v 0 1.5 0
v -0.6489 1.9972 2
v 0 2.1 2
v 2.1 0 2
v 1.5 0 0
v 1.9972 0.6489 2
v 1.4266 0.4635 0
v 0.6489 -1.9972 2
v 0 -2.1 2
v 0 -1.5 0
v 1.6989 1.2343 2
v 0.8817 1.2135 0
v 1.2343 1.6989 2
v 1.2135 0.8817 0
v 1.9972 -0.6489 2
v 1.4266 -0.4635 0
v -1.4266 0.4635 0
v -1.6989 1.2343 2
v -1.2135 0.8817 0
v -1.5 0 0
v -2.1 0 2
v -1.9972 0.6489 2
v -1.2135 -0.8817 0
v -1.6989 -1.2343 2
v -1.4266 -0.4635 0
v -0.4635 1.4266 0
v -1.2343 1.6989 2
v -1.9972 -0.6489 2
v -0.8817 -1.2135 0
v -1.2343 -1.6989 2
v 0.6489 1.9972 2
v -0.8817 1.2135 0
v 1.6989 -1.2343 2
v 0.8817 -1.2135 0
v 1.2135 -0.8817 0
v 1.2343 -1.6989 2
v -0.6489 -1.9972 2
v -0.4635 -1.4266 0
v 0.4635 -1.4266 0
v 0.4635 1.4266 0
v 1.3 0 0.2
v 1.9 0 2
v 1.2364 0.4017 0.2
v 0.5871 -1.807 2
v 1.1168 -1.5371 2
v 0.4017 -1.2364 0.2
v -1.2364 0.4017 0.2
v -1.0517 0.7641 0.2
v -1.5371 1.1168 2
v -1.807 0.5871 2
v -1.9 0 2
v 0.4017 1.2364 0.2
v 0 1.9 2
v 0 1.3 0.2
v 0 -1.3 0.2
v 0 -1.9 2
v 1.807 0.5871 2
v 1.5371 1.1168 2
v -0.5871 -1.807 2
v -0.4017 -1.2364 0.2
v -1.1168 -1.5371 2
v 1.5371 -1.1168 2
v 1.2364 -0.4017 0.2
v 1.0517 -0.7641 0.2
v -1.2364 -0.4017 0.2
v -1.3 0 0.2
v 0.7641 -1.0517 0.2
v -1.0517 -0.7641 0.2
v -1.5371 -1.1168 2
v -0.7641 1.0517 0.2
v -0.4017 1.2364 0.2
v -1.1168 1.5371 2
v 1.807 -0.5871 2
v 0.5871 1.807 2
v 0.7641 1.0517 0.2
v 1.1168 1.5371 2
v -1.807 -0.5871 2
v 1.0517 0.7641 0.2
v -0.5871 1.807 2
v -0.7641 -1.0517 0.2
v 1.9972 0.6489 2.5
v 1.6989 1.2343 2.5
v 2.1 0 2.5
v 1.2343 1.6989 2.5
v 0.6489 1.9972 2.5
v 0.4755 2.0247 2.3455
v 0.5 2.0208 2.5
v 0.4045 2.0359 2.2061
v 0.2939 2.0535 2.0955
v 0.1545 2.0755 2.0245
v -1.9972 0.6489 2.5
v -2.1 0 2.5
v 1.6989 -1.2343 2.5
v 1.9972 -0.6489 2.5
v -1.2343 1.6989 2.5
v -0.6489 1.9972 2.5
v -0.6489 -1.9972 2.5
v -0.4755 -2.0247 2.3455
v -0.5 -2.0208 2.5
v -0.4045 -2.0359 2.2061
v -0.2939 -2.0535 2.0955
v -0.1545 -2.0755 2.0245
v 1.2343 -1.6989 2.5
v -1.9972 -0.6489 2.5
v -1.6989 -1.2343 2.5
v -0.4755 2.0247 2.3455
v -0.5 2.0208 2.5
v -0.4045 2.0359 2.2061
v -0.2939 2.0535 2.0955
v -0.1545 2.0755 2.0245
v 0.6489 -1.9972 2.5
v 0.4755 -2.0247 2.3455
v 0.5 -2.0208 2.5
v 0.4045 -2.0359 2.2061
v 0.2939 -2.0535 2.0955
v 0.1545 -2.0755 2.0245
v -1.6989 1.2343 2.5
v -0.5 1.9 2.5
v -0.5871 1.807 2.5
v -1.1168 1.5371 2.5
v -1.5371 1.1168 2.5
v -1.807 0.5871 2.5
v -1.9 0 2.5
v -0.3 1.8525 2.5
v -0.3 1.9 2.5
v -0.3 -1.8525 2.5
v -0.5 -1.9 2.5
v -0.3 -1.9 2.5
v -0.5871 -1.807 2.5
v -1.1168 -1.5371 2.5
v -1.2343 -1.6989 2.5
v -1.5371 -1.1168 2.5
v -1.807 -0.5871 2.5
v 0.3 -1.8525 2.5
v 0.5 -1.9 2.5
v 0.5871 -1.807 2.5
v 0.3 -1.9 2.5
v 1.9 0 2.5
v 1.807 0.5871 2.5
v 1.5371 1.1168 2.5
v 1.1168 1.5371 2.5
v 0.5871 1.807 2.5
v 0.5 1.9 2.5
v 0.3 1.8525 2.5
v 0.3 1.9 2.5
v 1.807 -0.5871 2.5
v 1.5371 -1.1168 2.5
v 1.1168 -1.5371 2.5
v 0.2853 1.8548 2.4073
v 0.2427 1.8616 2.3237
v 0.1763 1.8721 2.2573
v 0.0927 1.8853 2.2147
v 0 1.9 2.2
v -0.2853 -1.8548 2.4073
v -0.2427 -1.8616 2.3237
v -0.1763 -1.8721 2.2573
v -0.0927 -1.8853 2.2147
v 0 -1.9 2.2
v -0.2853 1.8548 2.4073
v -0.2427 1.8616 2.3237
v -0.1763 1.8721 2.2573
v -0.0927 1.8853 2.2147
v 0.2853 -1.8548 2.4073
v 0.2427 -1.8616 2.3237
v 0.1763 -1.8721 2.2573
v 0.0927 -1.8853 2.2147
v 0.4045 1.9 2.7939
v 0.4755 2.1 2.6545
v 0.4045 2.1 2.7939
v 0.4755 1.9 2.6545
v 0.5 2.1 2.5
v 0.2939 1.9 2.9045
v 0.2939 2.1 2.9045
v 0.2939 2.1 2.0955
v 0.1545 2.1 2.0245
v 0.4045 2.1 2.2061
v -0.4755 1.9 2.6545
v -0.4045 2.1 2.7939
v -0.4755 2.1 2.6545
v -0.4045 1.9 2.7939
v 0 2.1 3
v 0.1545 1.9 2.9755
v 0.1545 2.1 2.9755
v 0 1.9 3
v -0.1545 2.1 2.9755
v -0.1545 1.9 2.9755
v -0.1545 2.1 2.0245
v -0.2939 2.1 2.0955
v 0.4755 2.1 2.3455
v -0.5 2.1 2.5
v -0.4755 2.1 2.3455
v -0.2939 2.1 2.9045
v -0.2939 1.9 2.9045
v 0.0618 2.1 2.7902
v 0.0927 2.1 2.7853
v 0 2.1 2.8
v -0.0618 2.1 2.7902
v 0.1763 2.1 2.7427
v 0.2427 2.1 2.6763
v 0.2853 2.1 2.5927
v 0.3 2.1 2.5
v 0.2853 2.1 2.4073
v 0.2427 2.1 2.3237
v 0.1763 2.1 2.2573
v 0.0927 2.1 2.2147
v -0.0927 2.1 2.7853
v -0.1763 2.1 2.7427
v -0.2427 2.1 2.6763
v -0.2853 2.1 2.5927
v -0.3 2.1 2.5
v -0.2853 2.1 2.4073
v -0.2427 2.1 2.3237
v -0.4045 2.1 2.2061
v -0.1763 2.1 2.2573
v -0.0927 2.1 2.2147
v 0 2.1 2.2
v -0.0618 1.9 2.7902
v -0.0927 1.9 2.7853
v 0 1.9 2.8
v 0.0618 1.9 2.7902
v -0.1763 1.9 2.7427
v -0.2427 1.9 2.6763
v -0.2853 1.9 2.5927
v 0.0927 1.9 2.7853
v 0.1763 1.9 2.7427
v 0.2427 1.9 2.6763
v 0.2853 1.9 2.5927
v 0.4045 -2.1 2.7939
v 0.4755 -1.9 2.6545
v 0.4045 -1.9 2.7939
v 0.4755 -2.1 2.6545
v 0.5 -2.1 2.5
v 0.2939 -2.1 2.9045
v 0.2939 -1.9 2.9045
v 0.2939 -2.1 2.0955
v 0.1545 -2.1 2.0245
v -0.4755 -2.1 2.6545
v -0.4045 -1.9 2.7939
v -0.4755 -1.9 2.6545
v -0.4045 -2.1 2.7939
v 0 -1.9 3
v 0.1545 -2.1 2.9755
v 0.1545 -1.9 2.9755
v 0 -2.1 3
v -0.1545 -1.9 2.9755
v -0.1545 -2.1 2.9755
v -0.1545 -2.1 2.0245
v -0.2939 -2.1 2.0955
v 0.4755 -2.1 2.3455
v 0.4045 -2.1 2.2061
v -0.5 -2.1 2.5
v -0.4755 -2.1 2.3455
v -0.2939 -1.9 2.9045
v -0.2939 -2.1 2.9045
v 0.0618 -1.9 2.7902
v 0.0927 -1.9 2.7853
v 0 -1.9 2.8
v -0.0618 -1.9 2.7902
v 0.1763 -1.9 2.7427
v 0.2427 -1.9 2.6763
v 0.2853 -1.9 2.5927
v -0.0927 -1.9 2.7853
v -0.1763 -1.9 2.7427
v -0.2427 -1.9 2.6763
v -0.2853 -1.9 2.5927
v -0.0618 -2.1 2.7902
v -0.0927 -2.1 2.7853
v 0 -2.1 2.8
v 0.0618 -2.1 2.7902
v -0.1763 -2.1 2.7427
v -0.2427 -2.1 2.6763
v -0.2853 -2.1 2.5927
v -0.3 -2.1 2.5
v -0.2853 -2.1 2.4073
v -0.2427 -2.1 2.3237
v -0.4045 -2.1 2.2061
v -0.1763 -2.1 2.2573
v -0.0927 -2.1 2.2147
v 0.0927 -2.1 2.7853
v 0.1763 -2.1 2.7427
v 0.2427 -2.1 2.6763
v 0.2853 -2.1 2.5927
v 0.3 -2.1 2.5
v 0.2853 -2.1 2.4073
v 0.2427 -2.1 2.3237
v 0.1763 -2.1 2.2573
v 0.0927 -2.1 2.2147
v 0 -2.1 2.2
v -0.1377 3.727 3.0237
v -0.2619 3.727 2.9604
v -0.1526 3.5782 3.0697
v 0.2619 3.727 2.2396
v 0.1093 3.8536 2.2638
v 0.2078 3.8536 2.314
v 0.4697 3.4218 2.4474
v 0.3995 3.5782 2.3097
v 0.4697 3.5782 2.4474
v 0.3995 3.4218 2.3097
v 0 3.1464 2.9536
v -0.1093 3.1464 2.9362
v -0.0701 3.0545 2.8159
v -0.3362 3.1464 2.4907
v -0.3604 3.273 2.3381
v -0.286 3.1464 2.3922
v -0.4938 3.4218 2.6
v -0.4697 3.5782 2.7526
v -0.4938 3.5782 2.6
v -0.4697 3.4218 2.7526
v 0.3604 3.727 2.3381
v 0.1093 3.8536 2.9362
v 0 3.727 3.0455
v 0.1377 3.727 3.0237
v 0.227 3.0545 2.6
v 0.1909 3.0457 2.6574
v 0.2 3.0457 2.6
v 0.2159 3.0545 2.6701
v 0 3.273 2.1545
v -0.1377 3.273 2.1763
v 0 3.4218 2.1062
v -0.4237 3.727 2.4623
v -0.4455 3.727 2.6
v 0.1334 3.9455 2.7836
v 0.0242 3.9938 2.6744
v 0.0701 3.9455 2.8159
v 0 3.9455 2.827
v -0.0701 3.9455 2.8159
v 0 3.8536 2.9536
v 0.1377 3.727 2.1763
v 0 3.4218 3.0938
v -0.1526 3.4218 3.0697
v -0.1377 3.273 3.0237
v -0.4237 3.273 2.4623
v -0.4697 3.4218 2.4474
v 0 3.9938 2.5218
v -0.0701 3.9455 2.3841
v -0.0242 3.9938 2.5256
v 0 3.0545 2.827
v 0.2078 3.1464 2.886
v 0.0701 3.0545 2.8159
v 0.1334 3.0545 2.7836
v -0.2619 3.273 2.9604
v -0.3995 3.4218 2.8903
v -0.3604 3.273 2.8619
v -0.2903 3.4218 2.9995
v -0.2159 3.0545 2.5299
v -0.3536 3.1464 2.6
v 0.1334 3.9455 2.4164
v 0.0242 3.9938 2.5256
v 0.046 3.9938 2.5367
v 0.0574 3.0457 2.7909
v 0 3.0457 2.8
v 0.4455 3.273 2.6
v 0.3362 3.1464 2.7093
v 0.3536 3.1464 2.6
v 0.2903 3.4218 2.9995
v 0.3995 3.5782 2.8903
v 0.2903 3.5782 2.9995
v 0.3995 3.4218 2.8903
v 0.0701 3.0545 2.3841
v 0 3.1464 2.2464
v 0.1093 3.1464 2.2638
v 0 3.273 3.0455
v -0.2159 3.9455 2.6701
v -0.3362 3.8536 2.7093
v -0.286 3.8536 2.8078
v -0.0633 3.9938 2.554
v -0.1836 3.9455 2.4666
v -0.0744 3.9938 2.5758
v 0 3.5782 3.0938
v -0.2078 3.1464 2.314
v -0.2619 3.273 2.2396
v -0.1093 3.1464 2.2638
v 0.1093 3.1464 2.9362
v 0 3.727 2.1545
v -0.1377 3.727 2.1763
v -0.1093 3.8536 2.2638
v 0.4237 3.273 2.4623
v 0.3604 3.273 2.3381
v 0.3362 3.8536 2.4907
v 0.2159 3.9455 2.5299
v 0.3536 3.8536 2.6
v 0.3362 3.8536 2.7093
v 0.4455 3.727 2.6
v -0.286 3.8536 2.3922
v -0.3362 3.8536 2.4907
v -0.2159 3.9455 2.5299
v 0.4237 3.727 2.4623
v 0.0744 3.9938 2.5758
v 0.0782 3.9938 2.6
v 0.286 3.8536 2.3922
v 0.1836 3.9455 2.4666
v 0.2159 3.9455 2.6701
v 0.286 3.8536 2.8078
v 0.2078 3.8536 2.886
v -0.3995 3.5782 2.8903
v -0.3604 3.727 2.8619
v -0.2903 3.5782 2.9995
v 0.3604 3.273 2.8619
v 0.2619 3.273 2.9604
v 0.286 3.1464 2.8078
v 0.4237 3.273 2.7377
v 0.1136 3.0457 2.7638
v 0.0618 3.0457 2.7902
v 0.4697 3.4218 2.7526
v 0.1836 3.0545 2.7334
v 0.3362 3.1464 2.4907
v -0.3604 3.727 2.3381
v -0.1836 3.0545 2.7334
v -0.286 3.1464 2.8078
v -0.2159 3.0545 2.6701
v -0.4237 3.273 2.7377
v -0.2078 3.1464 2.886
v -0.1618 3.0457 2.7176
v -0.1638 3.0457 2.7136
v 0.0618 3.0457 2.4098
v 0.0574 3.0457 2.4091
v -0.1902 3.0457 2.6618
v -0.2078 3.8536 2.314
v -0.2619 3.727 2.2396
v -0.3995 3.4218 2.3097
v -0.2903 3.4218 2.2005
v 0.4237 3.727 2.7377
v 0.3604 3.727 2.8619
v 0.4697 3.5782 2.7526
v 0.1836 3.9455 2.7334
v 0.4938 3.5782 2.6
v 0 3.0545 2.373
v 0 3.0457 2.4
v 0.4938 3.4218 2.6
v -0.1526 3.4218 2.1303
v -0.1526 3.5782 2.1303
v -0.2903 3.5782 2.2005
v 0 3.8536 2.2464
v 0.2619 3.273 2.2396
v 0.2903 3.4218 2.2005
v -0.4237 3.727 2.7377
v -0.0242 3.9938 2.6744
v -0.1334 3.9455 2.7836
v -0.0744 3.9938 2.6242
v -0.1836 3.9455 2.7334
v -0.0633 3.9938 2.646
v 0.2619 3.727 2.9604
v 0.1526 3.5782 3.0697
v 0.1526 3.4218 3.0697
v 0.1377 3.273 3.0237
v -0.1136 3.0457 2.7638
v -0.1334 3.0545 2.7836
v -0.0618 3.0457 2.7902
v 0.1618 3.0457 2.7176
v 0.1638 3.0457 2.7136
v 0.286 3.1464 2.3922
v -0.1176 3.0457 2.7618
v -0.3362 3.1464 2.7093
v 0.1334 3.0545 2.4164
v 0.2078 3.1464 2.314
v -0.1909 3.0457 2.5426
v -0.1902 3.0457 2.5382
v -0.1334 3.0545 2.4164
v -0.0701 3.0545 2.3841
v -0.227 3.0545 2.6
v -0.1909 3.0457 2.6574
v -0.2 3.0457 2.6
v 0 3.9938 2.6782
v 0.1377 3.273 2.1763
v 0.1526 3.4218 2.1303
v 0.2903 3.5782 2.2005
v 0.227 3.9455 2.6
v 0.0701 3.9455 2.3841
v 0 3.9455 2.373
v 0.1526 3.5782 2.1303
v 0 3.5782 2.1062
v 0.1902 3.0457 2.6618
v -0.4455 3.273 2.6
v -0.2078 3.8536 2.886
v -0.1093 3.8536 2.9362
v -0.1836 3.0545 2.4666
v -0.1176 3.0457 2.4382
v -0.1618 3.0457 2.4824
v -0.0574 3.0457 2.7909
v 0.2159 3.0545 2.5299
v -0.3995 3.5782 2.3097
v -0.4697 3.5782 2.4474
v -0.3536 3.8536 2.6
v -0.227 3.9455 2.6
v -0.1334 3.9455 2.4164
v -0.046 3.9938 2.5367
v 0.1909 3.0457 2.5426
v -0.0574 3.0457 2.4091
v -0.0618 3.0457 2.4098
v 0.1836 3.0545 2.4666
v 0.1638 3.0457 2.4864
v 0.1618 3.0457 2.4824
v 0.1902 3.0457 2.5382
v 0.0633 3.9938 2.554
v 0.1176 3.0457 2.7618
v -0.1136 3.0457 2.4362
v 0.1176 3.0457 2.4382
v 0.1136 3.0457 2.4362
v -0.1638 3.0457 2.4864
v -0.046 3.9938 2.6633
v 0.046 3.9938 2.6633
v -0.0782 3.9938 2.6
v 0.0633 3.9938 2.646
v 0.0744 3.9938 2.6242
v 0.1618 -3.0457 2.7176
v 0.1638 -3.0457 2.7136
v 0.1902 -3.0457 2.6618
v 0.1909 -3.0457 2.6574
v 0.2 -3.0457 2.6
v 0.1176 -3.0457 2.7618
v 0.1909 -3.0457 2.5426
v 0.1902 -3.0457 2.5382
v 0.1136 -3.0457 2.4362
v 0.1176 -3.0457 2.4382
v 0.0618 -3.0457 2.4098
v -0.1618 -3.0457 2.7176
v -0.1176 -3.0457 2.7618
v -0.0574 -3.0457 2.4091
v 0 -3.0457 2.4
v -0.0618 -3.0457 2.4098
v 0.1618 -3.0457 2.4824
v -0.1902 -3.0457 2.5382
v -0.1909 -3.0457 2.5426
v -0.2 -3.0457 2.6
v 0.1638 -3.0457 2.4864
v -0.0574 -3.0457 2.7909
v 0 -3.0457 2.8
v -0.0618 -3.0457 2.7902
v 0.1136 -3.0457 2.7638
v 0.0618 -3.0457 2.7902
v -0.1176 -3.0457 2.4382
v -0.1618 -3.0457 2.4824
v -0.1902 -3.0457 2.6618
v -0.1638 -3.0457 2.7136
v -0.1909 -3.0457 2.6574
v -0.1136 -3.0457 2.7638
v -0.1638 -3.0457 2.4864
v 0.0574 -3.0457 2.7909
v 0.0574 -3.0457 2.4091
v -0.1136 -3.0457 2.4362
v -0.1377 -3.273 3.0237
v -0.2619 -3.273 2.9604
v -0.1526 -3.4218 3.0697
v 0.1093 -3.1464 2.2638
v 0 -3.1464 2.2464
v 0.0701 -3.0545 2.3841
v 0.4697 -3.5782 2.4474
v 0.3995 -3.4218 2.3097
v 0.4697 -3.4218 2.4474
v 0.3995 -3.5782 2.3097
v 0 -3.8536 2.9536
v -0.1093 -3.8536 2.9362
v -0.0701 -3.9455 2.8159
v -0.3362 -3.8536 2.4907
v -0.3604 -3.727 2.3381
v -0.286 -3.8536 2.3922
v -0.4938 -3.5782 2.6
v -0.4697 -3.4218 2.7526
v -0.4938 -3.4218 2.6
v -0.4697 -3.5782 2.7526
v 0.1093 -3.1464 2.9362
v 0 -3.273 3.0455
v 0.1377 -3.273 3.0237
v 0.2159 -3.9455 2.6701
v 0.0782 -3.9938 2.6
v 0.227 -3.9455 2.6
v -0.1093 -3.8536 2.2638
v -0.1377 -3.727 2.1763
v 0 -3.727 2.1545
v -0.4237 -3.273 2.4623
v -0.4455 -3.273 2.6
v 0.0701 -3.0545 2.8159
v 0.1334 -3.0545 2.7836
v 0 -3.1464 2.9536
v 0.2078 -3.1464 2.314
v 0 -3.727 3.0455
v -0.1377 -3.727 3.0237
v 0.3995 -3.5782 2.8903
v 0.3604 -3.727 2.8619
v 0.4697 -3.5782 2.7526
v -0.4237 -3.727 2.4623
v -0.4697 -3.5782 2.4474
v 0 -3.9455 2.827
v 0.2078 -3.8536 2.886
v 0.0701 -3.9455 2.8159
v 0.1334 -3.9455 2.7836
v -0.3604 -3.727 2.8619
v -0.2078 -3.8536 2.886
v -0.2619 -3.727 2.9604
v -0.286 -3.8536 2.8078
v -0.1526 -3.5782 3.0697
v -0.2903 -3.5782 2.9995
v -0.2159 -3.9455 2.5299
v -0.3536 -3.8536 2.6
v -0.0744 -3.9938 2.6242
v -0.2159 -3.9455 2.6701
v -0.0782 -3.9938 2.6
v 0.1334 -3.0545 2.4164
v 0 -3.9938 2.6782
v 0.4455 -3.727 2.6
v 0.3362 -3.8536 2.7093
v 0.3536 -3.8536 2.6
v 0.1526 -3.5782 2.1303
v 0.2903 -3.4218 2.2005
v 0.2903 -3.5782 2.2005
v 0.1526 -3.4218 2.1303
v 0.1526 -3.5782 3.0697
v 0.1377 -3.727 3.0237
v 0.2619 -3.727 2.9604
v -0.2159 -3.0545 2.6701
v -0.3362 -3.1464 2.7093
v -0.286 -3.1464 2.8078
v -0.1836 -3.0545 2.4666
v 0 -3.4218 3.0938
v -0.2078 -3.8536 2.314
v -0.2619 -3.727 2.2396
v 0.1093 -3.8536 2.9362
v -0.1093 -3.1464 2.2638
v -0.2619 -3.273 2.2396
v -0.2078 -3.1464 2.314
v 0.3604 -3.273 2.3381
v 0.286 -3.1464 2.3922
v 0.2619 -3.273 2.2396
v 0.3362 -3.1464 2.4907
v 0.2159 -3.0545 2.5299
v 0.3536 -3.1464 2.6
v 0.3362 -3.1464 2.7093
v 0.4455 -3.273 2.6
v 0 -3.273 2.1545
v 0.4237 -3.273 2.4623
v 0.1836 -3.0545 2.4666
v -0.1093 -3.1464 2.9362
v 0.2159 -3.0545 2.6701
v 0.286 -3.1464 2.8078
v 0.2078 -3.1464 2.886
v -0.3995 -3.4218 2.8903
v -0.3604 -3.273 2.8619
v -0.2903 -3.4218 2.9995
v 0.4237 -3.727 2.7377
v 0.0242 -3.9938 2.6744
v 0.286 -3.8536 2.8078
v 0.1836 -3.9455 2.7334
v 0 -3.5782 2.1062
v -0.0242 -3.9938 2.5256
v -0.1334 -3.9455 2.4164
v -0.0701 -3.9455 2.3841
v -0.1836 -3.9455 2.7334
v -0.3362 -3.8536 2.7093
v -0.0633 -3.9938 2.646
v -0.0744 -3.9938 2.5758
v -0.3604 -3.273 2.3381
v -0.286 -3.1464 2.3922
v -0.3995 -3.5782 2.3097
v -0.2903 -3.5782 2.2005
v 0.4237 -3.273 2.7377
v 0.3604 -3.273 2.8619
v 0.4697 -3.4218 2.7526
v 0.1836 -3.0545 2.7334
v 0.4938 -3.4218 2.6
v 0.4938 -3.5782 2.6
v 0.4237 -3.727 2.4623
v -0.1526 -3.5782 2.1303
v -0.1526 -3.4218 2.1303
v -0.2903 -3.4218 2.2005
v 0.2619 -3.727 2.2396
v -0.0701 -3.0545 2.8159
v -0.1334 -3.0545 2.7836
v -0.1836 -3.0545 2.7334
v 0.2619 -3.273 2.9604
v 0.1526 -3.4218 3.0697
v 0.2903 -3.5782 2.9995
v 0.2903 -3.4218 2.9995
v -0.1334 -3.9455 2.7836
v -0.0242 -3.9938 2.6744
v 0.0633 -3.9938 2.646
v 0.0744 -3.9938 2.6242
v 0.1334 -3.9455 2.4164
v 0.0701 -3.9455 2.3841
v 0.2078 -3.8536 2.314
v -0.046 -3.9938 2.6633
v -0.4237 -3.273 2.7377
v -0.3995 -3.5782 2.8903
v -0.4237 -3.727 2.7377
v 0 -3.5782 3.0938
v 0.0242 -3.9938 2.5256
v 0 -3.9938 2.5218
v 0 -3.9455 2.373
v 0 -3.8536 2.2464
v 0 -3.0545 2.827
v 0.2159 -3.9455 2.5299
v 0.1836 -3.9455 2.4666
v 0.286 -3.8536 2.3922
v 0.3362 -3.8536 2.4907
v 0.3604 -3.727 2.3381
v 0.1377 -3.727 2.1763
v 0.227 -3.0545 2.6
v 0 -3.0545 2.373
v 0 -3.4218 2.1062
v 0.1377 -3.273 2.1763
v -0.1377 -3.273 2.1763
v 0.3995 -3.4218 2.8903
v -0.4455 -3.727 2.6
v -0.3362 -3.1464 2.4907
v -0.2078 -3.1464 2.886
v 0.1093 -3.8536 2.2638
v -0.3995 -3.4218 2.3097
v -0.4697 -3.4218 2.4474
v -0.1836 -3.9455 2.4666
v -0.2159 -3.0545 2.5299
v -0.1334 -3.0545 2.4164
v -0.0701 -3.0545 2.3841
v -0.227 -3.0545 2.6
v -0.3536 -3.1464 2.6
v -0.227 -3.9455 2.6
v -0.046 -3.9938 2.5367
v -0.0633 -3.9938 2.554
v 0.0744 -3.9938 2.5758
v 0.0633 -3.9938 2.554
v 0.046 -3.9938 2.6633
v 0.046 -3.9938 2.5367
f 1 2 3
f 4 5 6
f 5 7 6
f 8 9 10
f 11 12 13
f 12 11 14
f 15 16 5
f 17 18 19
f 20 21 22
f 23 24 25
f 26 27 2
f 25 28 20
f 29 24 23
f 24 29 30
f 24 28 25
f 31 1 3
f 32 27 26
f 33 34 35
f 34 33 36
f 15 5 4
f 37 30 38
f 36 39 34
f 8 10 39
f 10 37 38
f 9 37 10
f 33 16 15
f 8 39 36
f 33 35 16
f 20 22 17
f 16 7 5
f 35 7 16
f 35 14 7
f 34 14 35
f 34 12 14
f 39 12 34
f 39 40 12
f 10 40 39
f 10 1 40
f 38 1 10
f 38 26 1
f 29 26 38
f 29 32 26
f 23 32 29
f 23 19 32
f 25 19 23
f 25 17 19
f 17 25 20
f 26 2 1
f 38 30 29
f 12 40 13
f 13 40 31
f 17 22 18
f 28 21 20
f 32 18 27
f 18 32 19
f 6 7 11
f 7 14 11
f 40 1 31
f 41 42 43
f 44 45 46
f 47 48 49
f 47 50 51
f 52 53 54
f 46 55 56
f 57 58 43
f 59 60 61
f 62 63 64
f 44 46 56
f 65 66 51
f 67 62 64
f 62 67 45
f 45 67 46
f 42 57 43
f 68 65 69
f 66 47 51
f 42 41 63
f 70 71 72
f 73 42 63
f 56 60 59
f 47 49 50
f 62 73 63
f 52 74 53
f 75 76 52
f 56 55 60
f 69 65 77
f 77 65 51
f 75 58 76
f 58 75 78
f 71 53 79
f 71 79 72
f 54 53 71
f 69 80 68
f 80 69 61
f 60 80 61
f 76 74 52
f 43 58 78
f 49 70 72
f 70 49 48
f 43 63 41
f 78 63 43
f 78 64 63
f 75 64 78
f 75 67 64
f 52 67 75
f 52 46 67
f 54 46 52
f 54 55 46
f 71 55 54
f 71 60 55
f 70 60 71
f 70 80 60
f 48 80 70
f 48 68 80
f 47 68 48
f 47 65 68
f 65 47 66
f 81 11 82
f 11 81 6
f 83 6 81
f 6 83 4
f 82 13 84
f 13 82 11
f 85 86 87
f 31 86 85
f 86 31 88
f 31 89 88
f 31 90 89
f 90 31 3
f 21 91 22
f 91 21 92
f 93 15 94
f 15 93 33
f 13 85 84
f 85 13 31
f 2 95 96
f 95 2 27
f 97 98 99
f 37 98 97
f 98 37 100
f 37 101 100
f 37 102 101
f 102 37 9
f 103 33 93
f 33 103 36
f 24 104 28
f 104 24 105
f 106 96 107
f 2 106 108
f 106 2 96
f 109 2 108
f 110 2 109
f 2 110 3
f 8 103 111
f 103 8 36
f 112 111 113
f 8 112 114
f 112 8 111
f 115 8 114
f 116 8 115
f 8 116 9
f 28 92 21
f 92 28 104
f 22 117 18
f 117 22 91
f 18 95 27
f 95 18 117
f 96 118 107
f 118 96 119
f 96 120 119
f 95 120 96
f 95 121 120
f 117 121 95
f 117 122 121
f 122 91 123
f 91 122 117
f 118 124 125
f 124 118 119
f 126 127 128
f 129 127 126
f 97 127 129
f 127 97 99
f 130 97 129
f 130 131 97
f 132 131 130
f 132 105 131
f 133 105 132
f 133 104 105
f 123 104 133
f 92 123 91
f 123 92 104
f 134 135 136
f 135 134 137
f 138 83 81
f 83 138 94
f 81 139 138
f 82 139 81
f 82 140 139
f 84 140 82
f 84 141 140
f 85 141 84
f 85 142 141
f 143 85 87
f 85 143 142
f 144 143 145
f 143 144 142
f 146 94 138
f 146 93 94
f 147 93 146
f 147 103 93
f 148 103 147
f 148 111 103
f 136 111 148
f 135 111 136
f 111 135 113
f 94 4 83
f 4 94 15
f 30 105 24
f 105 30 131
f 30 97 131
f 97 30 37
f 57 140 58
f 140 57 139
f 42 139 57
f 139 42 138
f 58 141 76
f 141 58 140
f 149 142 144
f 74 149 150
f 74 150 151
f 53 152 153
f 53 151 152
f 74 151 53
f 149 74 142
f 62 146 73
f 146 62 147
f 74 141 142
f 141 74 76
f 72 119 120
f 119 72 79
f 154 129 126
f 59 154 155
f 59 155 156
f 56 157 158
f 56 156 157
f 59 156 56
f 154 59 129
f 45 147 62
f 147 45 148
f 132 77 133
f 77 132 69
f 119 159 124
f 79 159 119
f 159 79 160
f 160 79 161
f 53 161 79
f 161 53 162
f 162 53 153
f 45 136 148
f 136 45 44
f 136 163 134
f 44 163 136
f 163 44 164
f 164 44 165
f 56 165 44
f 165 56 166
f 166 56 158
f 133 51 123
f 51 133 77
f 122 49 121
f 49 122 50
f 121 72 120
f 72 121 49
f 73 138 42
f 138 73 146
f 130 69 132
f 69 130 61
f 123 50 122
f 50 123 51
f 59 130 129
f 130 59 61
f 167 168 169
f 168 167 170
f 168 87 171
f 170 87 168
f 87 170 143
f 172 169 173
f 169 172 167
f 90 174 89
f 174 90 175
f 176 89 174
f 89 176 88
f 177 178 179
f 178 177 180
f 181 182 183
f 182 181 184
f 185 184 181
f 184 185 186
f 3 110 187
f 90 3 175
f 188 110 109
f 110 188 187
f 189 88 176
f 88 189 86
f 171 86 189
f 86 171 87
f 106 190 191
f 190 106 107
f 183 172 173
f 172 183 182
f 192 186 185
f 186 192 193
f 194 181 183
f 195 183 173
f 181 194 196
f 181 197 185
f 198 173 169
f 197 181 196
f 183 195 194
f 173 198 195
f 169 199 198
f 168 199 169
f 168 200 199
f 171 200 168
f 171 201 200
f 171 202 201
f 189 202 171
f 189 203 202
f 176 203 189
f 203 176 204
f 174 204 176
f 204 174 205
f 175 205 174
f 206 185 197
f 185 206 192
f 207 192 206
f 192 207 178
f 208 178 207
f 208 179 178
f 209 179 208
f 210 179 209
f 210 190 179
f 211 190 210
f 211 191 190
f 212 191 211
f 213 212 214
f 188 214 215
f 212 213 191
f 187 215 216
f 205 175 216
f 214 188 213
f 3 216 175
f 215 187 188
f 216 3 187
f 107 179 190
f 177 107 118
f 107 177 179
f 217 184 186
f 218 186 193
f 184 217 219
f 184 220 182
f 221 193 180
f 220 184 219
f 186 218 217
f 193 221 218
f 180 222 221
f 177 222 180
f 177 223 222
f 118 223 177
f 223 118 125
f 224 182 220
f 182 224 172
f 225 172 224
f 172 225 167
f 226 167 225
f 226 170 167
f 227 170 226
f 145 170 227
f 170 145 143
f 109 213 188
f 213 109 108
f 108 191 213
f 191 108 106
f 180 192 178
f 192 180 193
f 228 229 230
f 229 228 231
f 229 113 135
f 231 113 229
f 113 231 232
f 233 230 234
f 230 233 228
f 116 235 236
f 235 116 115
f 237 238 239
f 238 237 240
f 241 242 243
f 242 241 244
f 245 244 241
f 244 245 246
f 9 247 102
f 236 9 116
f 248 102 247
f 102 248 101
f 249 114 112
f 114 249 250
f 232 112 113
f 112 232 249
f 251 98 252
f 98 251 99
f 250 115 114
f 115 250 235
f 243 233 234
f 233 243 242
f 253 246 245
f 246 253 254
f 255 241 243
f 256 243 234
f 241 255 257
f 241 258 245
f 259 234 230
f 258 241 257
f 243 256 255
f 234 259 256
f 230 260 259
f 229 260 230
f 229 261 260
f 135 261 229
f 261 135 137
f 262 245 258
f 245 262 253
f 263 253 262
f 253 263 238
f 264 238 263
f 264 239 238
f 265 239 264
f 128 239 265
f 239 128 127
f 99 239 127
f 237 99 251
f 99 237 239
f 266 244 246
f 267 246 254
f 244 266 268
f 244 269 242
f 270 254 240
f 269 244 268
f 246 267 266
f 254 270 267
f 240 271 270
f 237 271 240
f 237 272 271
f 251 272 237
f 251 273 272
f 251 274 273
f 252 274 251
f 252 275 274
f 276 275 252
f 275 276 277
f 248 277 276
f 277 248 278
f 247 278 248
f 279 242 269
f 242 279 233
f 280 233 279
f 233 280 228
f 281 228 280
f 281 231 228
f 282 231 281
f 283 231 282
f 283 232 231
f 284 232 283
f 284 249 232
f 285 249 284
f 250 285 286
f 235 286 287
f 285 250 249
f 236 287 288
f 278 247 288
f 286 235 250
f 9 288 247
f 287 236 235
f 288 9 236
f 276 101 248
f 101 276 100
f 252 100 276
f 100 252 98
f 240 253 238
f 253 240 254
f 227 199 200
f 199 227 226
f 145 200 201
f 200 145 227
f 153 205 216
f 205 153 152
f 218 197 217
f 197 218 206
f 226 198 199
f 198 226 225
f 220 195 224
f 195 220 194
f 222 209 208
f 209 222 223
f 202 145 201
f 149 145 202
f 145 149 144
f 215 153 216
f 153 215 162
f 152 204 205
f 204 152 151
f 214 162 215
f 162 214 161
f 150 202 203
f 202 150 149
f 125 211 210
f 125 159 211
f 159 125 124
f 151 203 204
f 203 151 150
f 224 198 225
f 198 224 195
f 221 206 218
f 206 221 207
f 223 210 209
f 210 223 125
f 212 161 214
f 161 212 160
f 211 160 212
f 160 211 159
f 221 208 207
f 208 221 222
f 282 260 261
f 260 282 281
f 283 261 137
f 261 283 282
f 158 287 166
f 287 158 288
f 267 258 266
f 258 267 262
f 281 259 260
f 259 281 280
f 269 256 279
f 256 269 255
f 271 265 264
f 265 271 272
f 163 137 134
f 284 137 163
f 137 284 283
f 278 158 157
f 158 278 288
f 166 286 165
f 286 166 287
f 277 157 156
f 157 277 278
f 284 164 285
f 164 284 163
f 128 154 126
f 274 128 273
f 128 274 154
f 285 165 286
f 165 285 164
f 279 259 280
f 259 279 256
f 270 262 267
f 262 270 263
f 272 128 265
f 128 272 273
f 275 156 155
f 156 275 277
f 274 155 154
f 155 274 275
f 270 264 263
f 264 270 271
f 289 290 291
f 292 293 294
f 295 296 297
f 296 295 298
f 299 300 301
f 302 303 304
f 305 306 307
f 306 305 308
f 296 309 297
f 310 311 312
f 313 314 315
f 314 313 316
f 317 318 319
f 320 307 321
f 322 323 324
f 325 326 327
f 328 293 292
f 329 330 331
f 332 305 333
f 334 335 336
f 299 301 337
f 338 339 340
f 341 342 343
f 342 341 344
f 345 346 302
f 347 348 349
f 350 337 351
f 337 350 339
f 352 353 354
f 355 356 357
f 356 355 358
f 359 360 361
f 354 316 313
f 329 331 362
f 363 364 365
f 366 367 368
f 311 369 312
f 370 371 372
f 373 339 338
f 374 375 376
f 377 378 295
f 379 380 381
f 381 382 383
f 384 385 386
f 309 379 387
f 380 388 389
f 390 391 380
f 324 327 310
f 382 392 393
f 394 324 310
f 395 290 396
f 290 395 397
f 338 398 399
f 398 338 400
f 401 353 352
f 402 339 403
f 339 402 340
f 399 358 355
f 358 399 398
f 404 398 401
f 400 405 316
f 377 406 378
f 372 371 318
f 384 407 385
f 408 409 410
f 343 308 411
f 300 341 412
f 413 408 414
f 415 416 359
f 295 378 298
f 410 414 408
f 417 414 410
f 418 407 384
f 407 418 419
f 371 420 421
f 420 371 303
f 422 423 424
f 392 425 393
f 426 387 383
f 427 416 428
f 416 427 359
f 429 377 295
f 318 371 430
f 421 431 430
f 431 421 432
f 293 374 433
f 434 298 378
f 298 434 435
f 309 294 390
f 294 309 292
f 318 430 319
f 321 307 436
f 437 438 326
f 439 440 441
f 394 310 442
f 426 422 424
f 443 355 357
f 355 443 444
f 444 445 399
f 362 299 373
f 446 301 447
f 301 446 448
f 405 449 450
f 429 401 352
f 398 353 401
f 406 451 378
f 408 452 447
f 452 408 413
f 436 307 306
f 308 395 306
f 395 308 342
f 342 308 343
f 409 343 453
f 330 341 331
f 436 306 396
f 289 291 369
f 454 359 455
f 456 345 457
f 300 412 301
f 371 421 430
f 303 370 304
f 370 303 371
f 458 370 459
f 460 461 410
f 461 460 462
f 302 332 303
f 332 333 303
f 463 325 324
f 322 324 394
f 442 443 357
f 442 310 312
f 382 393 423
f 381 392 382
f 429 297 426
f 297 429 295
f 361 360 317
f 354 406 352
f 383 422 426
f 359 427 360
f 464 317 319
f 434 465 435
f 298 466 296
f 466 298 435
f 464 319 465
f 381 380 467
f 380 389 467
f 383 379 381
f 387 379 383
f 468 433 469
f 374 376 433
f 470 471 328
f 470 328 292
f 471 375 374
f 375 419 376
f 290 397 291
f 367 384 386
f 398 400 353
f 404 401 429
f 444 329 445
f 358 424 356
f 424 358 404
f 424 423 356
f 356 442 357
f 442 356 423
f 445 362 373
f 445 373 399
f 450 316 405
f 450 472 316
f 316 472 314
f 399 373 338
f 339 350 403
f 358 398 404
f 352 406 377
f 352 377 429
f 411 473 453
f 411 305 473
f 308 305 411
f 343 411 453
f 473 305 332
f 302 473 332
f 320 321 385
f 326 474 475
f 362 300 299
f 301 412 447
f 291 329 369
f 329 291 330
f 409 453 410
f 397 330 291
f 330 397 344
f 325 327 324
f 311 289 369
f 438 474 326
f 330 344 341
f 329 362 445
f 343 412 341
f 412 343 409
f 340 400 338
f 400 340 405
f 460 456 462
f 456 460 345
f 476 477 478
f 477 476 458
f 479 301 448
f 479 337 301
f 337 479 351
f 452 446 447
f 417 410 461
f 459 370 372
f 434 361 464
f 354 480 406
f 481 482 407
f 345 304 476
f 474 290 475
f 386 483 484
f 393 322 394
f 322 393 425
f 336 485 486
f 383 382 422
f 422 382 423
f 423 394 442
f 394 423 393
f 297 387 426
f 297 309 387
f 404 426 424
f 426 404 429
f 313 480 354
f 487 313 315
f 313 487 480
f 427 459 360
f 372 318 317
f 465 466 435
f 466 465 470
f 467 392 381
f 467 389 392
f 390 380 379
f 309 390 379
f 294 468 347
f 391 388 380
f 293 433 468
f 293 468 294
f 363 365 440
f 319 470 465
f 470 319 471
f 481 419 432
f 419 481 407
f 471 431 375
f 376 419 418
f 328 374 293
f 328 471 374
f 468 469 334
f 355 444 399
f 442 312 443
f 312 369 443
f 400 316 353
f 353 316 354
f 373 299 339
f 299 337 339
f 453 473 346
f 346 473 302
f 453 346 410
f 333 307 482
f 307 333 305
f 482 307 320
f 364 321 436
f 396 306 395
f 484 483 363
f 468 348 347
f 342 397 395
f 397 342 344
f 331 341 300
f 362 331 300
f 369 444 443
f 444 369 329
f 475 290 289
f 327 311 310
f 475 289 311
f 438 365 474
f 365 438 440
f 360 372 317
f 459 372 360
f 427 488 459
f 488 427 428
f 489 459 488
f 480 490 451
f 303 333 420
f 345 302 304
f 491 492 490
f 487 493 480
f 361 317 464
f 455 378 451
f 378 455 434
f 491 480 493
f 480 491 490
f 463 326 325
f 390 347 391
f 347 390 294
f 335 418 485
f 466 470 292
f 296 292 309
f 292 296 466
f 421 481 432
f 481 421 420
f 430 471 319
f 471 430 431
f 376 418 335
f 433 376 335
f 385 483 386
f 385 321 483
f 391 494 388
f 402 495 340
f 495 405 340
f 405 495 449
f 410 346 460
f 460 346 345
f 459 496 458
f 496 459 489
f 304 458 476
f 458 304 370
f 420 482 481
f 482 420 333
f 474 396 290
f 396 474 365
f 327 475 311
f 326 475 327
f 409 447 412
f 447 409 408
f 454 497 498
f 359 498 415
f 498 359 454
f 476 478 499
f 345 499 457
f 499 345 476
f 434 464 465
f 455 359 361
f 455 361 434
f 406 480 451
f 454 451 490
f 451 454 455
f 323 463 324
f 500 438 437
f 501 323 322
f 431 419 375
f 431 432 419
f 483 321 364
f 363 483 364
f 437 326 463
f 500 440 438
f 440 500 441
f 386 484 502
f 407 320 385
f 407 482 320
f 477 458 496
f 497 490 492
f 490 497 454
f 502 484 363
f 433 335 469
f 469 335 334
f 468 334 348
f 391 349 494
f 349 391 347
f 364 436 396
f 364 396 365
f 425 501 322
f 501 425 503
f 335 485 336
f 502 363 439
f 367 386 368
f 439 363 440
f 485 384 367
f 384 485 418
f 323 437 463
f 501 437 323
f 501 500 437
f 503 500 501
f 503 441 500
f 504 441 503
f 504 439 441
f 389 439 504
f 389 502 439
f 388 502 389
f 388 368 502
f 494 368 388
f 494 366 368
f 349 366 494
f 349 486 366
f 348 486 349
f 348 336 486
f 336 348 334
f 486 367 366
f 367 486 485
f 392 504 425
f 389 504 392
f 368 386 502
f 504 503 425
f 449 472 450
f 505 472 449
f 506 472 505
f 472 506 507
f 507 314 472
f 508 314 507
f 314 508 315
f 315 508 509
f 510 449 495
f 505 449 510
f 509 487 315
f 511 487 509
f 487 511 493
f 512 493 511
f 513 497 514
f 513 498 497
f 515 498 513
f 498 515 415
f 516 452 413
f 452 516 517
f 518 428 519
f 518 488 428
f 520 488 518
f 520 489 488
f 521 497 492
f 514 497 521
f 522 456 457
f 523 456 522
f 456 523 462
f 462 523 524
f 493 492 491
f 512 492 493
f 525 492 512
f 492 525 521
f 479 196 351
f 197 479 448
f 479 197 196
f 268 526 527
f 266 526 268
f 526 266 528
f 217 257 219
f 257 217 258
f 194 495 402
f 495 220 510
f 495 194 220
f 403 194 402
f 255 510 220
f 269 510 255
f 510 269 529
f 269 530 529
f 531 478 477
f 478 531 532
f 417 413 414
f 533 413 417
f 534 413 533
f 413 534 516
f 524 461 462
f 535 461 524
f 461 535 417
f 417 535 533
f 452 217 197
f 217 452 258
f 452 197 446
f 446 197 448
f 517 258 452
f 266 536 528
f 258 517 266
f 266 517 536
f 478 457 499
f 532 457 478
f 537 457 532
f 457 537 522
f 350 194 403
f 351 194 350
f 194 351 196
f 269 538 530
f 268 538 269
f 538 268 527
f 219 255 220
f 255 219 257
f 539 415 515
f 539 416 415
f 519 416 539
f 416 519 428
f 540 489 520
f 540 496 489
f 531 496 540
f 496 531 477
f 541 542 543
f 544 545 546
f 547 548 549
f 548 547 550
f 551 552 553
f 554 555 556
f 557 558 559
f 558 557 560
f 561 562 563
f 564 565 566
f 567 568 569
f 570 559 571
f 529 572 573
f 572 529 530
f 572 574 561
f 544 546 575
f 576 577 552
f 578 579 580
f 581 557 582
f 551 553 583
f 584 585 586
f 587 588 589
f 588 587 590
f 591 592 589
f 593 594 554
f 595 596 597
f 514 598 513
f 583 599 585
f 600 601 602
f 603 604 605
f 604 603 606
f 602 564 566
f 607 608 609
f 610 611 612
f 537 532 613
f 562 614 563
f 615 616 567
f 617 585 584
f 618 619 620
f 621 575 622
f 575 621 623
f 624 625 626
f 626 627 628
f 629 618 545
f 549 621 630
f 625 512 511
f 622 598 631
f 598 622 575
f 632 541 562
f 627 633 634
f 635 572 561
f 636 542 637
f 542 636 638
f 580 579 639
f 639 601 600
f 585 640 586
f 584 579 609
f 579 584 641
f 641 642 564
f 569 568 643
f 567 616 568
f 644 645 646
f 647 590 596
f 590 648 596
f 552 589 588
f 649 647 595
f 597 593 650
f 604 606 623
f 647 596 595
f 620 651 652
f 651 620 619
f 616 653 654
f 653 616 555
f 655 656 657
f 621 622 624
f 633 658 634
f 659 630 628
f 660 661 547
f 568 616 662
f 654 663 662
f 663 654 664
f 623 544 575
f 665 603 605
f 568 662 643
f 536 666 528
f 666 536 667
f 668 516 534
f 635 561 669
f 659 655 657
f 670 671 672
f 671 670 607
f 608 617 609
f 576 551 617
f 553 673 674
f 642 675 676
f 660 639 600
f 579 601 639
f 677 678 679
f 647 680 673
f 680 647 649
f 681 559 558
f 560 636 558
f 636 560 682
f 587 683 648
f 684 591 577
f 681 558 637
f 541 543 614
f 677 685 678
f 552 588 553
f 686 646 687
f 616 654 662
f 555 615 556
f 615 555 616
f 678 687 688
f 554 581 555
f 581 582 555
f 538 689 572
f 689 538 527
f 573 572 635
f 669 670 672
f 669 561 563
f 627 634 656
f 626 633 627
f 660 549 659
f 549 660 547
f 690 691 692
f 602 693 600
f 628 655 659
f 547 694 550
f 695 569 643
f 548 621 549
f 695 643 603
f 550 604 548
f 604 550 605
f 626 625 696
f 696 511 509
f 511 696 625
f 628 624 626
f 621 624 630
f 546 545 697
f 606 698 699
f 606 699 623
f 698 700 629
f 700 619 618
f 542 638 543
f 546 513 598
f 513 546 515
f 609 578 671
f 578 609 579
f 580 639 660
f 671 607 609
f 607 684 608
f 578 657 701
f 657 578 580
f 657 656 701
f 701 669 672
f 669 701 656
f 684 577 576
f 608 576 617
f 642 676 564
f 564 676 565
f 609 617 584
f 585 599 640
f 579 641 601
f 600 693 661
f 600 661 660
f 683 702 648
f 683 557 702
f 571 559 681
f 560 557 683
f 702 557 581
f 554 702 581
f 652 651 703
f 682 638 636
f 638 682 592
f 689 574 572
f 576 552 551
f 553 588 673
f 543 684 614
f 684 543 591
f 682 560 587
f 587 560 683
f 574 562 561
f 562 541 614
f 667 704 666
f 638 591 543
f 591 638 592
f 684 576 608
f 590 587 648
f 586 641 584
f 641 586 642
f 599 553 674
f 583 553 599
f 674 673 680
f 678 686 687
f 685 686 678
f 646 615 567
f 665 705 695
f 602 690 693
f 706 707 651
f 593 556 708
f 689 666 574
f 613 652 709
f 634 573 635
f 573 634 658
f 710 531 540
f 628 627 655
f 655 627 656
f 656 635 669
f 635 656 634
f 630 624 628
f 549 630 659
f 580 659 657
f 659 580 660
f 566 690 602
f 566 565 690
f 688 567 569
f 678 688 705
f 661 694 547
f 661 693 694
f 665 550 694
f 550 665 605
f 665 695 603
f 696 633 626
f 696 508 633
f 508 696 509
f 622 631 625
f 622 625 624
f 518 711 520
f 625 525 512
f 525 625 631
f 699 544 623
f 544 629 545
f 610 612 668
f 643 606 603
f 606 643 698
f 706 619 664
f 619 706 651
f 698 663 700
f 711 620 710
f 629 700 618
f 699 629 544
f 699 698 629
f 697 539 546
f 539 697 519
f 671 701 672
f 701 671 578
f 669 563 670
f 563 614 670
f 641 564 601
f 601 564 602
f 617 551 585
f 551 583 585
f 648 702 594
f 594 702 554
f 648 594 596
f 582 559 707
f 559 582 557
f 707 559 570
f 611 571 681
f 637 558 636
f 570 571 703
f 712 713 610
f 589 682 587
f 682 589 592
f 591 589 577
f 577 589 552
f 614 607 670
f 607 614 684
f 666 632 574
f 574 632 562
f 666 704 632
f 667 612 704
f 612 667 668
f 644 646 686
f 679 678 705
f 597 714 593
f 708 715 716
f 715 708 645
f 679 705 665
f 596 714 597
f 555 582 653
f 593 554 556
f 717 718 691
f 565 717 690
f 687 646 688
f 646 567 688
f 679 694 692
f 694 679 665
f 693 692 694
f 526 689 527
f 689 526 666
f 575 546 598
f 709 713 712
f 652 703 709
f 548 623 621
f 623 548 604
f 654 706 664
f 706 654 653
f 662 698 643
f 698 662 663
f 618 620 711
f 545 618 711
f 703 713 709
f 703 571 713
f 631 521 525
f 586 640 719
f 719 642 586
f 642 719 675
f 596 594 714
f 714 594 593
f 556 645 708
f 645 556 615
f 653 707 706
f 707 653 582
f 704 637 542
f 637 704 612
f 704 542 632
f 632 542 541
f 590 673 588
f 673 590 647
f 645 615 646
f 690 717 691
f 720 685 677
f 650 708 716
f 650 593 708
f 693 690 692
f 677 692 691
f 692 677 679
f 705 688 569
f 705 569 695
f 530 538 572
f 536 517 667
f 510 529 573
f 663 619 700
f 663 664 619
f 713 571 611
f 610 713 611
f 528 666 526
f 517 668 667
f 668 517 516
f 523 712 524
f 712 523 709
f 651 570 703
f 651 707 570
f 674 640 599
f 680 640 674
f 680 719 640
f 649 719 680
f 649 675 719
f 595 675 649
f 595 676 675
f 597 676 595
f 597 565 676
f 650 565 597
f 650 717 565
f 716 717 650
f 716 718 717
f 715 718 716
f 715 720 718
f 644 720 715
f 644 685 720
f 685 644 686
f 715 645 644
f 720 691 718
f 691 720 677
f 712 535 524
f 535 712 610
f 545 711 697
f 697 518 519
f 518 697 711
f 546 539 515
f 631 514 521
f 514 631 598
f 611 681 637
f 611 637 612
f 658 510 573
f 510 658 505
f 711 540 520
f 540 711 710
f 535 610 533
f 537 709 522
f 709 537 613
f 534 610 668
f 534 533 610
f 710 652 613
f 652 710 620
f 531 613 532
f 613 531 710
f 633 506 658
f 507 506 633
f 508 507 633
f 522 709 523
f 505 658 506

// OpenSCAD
module bat_cu_bile(lungime_bat,raza_bat,raza_bila,rezolutie)
{
    union(){
       color("red") sphere(r=raza_bila,$fn=rezolutie);
       color("white") translate([0,0,raza_bila-0.5]) cylinder(h=lungime_bat,r=raza_bat,$fn=rezolutie);
       color("red") translate([0,0,raza_bila+lungime_bat-0.5])sphere(r=raza_bila,$fn=rezolutie);
    }
}
//--------------Modul creare bat cu maciulii la cap

module ciubar_baza(inaltime_ciubar,raza_M_ciubar,raza_m_ciubar,grosime_ciubar,rezolutie)
{
    difference(){
        cylinder(h=inaltime_ciubar,r1=raza_m_ciubar,r2=raza_M_ciubar,$fn=rezolutie);
    translate([0,0,grosime_ciubar])    cylinder(h=inaltime_ciubar-grosime_ciubar,r1=(raza_m_ciubar-grosime_ciubar),r2=(raza_M_ciubar-grosime_ciubar),$fn=rezolutie);
    }
}

//------------Incep constructia ciubarului cu baza

module maner_ciubar(inaltime_maner,raza_M_ciubar,grosime_ciubar,r_M_inel,r_m_inel,rezolutie)
{
    difference(){
    union(){
        difference(){
                    cylinder(h=inaltime_maner,r=raza_M_ciubar,$fn=rezolutie);
                    cylinder(h=inaltime_maner,r=raza_M_ciubar-grosime_ciubar,$fn        =rezolutie);
                }//end diference 
                
    //-------------Am creat gaura in buza ciubarului-------
          translate([0,raza_M_ciubar,inaltime_maner]) rotate([90,0,0]) cylinder(h=grosime_ciubar,r=r_M_inel,$fn=rezolutie);  
          translate([0,-raza_M_ciubar+grosime_ciubar,inaltime_maner]) rotate([90,0,0])  cylinder(h=grosime_ciubar,r=r_M_inel,$fn=rezolutie);     
                } //end union         
    //-----------Pozitionez cele doua inele pe marginea buzei--------
    //-----------Unesc obiectele sa pot da gaura prin ele----------
          translate([0,raza_M_ciubar,inaltime_maner]) rotate([90,0,0]) cylinder(h=grosime_ciubar+0.5,r=r_m_inel,$fn=rezolutie); 
          translate([0,-raza_M_ciubar+grosime_ciubar+0.5,inaltime_maner]) rotate([90,0,0])  cylinder(h=grosime_ciubar+0.5,r=r_m_inel,$fn=rezolutie);  
            }//end diferenta
            
    //--------------Dau gaura in cele doua inele
   
    
}
// cred ca prea m-am complicat

module ciubar(h_ciub,r_M_ciub,r_m_ciub,h_maner,gro_ciub,r_inelM_maner,r_inelm_maner,rez)
{
    union()
    {
    color("brown")    ciubar_baza(inaltime_ciubar=h_ciub,raza_M_ciubar=r_M_ciub,raza_m_ciubar=r_m_ciub,grosime_ciubar=gro_ciub,rezolutie=rez);
    color("brown")    translate([0,0,h_ciub]) maner_ciubar(inaltime_maner=h_maner,raza_M_ciubar=r_M_ciub,grosime_ciubar=gro_ciub,r_M_inel=r_inelM_maner,r_m_inel=r_inelm_maner,rezolutie=rez);
        
        }
  //------------Unesc baza ciubarului cu buza lui 
    }
//#######################de predat 
    ciubar(h_ciub=2,r_M_ciub=2.1,r_m_ciub=1.5,h_maner=0.5,gro_ciub=0.2,r_inelM_maner=0.5,r_inelm_maner=0.3,rez=20);
    translate([0,7/2,2.6]) rotate([90,0,0]) bat_cu_bile(lungime_bat=7,raza_bat=0.2,raza_bila=0.5,rezolutie=20);
    
 //h ciubar+h maner + r gaura maner - r bat = pozitia de atingere maner cu bat
 //########## end de predat############
    
